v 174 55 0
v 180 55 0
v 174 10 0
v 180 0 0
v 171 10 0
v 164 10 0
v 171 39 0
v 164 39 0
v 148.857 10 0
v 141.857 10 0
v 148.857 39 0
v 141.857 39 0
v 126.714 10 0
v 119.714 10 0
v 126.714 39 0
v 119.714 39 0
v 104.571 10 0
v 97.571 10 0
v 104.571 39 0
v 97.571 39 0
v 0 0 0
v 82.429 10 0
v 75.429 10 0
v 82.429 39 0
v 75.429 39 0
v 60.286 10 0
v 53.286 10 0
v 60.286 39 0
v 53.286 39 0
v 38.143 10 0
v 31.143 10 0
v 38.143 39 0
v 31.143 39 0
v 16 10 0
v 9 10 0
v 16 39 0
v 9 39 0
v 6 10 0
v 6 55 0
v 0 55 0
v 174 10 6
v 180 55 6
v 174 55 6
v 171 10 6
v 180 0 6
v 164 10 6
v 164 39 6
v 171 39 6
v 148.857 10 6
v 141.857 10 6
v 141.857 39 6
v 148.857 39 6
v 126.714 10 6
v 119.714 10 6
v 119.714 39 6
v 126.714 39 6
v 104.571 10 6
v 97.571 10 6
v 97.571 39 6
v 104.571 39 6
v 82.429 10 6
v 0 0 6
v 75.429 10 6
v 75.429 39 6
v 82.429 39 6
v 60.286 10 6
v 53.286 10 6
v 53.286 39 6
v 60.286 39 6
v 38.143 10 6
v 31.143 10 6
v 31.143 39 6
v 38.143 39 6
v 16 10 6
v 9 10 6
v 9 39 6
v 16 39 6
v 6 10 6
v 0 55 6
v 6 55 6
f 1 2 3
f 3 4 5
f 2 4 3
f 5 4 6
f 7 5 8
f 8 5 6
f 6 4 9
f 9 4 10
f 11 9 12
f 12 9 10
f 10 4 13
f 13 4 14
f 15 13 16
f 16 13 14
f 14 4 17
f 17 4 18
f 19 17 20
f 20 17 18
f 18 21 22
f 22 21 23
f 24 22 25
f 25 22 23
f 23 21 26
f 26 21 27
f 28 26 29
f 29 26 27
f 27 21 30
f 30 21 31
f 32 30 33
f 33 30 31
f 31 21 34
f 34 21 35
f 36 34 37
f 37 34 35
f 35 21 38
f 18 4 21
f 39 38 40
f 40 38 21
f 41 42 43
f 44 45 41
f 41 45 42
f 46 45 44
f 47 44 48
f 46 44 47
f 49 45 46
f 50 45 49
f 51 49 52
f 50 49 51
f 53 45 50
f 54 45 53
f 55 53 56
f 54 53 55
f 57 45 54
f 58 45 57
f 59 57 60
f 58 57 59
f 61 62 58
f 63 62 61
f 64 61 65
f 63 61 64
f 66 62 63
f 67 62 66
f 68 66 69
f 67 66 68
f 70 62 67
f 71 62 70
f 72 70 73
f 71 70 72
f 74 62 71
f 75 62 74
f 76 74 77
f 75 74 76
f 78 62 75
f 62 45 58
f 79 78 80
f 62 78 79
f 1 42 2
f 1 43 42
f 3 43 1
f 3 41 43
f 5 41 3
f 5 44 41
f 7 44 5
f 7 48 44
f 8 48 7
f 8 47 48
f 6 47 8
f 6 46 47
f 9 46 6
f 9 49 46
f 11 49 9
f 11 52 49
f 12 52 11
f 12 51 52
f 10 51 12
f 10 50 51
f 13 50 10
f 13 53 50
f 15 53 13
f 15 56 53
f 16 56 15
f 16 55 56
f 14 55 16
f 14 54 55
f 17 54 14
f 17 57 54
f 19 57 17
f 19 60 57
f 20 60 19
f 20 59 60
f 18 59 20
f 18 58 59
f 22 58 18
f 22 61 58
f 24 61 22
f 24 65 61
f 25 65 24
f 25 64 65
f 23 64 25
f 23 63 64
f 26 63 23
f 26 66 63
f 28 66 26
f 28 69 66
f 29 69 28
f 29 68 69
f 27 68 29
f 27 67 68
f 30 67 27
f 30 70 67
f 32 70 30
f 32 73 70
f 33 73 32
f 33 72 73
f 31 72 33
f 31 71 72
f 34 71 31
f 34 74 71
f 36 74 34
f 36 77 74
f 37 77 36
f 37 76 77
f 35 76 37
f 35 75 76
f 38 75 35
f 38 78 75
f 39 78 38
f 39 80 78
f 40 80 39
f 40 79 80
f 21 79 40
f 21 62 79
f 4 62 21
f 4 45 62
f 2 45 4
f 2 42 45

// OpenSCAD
$fn = 32;

// ----------------------------------------------------------------------
// Guard grille: 8 slats over a 180 x 55 mm plate
// ----------------------------------------------------------------------

// --- parameters (mm) ---
profile_height = 6;       // extrusion height
profile_points = 40;      // points of the closed outline

profile = [[0, 0], [180, 0], [180, 55], [174, 55], [174, 10], [171, 10], [171, 39], [164, 39], [164, 10], [148.857, 10], [148.857, 39], [141.857, 39], [141.857, 10], [126.714, 10], [126.714, 39], [119.714, 39], [119.714, 10], [104.571, 10], [104.571, 39], [97.571, 39], [97.571, 10], [82.429, 10], [82.429, 39], [75.429, 39], [75.429, 10], [60.286, 10], [60.286, 39], [53.286, 39], [53.286, 10], [38.143, 10], [38.143, 39], [31.143, 39], [31.143, 10], [16, 10], [16, 39], [9, 39], [9, 10], [6, 10], [6, 55], [0, 55]];  // single closed polygon, 40 points, counter clockwise

// --- the one profile operation ---
linear_extrude(height = profile_height) polygon(points = profile);
